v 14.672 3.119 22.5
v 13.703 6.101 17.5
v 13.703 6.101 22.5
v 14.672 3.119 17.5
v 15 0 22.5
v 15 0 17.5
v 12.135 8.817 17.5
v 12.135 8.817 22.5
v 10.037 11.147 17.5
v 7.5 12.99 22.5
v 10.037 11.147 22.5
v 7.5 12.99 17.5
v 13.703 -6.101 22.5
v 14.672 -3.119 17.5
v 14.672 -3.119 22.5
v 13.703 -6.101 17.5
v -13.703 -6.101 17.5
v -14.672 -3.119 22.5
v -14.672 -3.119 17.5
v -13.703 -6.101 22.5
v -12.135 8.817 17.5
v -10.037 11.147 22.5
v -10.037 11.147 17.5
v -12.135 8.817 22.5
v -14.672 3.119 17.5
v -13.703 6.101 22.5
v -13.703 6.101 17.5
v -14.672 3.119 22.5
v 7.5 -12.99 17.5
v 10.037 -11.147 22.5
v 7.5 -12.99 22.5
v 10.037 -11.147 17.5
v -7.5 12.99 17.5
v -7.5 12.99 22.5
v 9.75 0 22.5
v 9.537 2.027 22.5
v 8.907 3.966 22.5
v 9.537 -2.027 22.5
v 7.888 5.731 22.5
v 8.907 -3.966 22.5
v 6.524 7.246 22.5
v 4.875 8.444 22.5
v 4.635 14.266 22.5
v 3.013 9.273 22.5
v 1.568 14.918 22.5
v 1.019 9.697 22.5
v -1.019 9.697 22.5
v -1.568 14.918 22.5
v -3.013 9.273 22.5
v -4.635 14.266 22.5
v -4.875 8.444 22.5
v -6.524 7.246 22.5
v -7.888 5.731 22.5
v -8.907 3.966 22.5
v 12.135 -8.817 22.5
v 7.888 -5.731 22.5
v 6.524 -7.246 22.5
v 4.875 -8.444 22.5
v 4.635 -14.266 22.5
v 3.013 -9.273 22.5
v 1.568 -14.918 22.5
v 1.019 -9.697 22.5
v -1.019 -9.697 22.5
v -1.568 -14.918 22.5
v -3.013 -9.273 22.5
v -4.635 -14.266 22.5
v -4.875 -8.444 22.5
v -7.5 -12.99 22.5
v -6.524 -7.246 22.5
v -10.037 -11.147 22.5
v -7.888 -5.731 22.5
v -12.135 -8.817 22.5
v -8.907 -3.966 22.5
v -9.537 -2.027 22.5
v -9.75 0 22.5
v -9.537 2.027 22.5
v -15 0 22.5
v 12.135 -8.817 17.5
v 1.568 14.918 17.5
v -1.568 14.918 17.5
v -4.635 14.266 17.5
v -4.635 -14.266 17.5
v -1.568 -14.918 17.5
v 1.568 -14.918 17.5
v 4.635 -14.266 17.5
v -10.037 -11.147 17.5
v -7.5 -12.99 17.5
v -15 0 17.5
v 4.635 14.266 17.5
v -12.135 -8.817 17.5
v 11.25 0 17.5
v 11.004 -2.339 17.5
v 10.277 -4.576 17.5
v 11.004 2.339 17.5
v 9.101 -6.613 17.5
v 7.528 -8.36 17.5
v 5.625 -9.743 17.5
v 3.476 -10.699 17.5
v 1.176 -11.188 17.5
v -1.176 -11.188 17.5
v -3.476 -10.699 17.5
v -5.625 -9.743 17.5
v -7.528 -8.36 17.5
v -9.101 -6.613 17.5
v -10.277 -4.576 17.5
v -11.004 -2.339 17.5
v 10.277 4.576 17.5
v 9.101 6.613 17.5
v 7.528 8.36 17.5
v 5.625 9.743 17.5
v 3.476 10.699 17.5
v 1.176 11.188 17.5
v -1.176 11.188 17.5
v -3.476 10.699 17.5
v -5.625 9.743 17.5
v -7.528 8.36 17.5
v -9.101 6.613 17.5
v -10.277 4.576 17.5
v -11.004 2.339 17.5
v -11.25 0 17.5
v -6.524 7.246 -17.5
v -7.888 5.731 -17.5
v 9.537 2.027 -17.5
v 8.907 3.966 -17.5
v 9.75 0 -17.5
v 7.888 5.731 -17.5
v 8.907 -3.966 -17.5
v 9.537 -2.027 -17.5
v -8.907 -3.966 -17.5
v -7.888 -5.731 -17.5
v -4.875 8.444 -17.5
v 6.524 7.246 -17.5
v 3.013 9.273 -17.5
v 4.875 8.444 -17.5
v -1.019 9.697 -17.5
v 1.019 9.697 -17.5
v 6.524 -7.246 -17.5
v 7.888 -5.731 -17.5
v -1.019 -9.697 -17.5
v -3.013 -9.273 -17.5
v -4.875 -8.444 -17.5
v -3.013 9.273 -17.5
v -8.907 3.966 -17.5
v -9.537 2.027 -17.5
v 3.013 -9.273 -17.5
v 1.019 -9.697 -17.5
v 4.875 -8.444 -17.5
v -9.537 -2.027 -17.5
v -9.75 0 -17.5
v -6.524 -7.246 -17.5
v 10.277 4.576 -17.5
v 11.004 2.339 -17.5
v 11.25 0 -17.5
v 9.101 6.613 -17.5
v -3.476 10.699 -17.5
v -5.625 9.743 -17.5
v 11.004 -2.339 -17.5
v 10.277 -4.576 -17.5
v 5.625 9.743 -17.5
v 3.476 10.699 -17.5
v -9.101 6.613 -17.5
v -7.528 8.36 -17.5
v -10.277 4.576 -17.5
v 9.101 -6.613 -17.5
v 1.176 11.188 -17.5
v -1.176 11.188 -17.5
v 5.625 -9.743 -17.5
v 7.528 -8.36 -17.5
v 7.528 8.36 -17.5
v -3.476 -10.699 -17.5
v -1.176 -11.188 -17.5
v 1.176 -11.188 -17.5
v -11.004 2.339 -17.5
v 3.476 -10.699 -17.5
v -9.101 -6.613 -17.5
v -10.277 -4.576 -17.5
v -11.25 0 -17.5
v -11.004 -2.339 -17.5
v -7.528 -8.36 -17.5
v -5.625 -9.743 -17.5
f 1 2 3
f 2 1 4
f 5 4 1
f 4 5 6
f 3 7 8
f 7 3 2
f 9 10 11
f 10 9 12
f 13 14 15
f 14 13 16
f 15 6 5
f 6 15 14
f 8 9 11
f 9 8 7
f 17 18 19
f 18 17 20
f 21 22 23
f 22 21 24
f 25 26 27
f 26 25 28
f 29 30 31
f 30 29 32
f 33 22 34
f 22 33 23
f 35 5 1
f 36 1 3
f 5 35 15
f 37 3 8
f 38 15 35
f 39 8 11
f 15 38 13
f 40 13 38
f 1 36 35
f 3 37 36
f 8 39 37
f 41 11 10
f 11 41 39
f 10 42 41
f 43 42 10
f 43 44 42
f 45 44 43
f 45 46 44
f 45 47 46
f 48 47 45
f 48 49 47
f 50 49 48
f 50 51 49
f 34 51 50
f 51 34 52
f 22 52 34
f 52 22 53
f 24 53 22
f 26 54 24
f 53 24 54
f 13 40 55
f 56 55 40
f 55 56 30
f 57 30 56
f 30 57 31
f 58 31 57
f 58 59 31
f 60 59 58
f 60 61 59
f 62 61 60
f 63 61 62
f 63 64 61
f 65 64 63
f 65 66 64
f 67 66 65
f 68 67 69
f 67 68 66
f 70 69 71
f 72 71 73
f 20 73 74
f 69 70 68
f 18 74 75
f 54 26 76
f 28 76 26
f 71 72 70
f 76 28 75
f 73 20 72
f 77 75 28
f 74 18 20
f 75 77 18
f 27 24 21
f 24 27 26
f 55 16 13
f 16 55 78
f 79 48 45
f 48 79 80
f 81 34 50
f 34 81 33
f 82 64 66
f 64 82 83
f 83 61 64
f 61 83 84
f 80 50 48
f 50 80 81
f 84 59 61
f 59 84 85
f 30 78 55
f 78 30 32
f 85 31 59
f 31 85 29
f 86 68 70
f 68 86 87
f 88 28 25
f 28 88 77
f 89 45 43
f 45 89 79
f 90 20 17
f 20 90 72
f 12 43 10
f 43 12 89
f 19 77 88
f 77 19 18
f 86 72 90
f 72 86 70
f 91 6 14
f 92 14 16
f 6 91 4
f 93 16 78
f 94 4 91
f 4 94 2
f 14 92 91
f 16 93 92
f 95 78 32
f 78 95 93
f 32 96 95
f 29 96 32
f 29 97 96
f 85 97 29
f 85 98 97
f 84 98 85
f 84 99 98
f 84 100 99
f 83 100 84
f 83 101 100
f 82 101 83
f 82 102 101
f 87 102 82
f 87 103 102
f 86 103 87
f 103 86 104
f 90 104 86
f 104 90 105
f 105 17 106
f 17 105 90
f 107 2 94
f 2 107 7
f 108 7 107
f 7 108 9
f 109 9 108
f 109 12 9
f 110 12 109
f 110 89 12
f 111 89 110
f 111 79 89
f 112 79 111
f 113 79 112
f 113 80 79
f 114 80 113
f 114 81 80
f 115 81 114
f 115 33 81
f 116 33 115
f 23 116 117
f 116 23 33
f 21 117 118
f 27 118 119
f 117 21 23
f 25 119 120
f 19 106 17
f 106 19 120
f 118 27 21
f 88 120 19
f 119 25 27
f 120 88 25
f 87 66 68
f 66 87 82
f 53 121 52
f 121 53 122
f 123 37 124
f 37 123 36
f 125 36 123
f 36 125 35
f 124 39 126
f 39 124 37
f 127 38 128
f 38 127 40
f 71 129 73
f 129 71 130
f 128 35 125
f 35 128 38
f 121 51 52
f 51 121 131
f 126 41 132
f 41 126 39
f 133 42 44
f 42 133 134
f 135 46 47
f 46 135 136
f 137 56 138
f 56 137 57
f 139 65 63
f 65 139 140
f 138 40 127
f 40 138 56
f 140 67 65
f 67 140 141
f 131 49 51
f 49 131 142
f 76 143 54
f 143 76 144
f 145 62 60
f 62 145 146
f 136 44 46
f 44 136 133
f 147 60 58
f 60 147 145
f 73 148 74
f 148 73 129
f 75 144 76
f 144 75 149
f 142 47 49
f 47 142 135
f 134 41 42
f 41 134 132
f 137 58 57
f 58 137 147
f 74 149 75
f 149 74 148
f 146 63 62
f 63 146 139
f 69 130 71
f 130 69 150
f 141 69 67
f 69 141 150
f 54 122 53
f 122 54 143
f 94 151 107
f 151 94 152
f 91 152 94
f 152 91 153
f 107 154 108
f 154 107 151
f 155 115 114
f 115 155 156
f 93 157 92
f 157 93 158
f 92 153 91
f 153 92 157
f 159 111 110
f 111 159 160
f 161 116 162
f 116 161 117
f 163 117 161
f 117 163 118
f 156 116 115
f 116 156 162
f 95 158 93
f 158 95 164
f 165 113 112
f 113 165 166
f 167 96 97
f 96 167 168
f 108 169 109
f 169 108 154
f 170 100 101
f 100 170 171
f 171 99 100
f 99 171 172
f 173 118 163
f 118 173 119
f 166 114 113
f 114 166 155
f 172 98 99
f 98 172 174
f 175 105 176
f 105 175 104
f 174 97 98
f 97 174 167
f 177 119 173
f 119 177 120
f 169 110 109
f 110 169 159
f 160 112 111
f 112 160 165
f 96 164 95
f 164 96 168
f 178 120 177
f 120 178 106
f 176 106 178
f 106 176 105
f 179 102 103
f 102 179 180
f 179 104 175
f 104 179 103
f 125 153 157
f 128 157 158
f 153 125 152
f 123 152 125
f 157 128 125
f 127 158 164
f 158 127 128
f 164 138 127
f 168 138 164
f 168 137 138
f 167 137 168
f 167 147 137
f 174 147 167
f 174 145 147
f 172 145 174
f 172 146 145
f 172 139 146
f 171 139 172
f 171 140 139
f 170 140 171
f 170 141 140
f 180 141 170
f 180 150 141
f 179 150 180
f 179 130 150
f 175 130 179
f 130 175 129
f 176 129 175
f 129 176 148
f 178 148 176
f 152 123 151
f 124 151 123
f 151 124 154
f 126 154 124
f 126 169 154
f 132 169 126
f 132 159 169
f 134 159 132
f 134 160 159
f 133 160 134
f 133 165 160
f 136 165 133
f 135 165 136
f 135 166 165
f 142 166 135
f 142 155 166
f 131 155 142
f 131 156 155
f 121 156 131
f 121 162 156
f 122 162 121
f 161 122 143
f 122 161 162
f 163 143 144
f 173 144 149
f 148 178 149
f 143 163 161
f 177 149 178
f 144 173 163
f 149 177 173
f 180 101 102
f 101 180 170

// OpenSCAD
ocular();

module top(){
    difference(){
        cylinder(d=30, h=5, center=true);
        cylinder(d=23-0.5-3, h=15, center=true);
    }
}
module ocular(){
    translate([0,0,35/2+5/2])
    top();
    difference(){
        cylinder(d=23-0.5, h = 35, center = true);
        cylinder(d=23-0.5-3, h = 40, center = true);
    }
}
